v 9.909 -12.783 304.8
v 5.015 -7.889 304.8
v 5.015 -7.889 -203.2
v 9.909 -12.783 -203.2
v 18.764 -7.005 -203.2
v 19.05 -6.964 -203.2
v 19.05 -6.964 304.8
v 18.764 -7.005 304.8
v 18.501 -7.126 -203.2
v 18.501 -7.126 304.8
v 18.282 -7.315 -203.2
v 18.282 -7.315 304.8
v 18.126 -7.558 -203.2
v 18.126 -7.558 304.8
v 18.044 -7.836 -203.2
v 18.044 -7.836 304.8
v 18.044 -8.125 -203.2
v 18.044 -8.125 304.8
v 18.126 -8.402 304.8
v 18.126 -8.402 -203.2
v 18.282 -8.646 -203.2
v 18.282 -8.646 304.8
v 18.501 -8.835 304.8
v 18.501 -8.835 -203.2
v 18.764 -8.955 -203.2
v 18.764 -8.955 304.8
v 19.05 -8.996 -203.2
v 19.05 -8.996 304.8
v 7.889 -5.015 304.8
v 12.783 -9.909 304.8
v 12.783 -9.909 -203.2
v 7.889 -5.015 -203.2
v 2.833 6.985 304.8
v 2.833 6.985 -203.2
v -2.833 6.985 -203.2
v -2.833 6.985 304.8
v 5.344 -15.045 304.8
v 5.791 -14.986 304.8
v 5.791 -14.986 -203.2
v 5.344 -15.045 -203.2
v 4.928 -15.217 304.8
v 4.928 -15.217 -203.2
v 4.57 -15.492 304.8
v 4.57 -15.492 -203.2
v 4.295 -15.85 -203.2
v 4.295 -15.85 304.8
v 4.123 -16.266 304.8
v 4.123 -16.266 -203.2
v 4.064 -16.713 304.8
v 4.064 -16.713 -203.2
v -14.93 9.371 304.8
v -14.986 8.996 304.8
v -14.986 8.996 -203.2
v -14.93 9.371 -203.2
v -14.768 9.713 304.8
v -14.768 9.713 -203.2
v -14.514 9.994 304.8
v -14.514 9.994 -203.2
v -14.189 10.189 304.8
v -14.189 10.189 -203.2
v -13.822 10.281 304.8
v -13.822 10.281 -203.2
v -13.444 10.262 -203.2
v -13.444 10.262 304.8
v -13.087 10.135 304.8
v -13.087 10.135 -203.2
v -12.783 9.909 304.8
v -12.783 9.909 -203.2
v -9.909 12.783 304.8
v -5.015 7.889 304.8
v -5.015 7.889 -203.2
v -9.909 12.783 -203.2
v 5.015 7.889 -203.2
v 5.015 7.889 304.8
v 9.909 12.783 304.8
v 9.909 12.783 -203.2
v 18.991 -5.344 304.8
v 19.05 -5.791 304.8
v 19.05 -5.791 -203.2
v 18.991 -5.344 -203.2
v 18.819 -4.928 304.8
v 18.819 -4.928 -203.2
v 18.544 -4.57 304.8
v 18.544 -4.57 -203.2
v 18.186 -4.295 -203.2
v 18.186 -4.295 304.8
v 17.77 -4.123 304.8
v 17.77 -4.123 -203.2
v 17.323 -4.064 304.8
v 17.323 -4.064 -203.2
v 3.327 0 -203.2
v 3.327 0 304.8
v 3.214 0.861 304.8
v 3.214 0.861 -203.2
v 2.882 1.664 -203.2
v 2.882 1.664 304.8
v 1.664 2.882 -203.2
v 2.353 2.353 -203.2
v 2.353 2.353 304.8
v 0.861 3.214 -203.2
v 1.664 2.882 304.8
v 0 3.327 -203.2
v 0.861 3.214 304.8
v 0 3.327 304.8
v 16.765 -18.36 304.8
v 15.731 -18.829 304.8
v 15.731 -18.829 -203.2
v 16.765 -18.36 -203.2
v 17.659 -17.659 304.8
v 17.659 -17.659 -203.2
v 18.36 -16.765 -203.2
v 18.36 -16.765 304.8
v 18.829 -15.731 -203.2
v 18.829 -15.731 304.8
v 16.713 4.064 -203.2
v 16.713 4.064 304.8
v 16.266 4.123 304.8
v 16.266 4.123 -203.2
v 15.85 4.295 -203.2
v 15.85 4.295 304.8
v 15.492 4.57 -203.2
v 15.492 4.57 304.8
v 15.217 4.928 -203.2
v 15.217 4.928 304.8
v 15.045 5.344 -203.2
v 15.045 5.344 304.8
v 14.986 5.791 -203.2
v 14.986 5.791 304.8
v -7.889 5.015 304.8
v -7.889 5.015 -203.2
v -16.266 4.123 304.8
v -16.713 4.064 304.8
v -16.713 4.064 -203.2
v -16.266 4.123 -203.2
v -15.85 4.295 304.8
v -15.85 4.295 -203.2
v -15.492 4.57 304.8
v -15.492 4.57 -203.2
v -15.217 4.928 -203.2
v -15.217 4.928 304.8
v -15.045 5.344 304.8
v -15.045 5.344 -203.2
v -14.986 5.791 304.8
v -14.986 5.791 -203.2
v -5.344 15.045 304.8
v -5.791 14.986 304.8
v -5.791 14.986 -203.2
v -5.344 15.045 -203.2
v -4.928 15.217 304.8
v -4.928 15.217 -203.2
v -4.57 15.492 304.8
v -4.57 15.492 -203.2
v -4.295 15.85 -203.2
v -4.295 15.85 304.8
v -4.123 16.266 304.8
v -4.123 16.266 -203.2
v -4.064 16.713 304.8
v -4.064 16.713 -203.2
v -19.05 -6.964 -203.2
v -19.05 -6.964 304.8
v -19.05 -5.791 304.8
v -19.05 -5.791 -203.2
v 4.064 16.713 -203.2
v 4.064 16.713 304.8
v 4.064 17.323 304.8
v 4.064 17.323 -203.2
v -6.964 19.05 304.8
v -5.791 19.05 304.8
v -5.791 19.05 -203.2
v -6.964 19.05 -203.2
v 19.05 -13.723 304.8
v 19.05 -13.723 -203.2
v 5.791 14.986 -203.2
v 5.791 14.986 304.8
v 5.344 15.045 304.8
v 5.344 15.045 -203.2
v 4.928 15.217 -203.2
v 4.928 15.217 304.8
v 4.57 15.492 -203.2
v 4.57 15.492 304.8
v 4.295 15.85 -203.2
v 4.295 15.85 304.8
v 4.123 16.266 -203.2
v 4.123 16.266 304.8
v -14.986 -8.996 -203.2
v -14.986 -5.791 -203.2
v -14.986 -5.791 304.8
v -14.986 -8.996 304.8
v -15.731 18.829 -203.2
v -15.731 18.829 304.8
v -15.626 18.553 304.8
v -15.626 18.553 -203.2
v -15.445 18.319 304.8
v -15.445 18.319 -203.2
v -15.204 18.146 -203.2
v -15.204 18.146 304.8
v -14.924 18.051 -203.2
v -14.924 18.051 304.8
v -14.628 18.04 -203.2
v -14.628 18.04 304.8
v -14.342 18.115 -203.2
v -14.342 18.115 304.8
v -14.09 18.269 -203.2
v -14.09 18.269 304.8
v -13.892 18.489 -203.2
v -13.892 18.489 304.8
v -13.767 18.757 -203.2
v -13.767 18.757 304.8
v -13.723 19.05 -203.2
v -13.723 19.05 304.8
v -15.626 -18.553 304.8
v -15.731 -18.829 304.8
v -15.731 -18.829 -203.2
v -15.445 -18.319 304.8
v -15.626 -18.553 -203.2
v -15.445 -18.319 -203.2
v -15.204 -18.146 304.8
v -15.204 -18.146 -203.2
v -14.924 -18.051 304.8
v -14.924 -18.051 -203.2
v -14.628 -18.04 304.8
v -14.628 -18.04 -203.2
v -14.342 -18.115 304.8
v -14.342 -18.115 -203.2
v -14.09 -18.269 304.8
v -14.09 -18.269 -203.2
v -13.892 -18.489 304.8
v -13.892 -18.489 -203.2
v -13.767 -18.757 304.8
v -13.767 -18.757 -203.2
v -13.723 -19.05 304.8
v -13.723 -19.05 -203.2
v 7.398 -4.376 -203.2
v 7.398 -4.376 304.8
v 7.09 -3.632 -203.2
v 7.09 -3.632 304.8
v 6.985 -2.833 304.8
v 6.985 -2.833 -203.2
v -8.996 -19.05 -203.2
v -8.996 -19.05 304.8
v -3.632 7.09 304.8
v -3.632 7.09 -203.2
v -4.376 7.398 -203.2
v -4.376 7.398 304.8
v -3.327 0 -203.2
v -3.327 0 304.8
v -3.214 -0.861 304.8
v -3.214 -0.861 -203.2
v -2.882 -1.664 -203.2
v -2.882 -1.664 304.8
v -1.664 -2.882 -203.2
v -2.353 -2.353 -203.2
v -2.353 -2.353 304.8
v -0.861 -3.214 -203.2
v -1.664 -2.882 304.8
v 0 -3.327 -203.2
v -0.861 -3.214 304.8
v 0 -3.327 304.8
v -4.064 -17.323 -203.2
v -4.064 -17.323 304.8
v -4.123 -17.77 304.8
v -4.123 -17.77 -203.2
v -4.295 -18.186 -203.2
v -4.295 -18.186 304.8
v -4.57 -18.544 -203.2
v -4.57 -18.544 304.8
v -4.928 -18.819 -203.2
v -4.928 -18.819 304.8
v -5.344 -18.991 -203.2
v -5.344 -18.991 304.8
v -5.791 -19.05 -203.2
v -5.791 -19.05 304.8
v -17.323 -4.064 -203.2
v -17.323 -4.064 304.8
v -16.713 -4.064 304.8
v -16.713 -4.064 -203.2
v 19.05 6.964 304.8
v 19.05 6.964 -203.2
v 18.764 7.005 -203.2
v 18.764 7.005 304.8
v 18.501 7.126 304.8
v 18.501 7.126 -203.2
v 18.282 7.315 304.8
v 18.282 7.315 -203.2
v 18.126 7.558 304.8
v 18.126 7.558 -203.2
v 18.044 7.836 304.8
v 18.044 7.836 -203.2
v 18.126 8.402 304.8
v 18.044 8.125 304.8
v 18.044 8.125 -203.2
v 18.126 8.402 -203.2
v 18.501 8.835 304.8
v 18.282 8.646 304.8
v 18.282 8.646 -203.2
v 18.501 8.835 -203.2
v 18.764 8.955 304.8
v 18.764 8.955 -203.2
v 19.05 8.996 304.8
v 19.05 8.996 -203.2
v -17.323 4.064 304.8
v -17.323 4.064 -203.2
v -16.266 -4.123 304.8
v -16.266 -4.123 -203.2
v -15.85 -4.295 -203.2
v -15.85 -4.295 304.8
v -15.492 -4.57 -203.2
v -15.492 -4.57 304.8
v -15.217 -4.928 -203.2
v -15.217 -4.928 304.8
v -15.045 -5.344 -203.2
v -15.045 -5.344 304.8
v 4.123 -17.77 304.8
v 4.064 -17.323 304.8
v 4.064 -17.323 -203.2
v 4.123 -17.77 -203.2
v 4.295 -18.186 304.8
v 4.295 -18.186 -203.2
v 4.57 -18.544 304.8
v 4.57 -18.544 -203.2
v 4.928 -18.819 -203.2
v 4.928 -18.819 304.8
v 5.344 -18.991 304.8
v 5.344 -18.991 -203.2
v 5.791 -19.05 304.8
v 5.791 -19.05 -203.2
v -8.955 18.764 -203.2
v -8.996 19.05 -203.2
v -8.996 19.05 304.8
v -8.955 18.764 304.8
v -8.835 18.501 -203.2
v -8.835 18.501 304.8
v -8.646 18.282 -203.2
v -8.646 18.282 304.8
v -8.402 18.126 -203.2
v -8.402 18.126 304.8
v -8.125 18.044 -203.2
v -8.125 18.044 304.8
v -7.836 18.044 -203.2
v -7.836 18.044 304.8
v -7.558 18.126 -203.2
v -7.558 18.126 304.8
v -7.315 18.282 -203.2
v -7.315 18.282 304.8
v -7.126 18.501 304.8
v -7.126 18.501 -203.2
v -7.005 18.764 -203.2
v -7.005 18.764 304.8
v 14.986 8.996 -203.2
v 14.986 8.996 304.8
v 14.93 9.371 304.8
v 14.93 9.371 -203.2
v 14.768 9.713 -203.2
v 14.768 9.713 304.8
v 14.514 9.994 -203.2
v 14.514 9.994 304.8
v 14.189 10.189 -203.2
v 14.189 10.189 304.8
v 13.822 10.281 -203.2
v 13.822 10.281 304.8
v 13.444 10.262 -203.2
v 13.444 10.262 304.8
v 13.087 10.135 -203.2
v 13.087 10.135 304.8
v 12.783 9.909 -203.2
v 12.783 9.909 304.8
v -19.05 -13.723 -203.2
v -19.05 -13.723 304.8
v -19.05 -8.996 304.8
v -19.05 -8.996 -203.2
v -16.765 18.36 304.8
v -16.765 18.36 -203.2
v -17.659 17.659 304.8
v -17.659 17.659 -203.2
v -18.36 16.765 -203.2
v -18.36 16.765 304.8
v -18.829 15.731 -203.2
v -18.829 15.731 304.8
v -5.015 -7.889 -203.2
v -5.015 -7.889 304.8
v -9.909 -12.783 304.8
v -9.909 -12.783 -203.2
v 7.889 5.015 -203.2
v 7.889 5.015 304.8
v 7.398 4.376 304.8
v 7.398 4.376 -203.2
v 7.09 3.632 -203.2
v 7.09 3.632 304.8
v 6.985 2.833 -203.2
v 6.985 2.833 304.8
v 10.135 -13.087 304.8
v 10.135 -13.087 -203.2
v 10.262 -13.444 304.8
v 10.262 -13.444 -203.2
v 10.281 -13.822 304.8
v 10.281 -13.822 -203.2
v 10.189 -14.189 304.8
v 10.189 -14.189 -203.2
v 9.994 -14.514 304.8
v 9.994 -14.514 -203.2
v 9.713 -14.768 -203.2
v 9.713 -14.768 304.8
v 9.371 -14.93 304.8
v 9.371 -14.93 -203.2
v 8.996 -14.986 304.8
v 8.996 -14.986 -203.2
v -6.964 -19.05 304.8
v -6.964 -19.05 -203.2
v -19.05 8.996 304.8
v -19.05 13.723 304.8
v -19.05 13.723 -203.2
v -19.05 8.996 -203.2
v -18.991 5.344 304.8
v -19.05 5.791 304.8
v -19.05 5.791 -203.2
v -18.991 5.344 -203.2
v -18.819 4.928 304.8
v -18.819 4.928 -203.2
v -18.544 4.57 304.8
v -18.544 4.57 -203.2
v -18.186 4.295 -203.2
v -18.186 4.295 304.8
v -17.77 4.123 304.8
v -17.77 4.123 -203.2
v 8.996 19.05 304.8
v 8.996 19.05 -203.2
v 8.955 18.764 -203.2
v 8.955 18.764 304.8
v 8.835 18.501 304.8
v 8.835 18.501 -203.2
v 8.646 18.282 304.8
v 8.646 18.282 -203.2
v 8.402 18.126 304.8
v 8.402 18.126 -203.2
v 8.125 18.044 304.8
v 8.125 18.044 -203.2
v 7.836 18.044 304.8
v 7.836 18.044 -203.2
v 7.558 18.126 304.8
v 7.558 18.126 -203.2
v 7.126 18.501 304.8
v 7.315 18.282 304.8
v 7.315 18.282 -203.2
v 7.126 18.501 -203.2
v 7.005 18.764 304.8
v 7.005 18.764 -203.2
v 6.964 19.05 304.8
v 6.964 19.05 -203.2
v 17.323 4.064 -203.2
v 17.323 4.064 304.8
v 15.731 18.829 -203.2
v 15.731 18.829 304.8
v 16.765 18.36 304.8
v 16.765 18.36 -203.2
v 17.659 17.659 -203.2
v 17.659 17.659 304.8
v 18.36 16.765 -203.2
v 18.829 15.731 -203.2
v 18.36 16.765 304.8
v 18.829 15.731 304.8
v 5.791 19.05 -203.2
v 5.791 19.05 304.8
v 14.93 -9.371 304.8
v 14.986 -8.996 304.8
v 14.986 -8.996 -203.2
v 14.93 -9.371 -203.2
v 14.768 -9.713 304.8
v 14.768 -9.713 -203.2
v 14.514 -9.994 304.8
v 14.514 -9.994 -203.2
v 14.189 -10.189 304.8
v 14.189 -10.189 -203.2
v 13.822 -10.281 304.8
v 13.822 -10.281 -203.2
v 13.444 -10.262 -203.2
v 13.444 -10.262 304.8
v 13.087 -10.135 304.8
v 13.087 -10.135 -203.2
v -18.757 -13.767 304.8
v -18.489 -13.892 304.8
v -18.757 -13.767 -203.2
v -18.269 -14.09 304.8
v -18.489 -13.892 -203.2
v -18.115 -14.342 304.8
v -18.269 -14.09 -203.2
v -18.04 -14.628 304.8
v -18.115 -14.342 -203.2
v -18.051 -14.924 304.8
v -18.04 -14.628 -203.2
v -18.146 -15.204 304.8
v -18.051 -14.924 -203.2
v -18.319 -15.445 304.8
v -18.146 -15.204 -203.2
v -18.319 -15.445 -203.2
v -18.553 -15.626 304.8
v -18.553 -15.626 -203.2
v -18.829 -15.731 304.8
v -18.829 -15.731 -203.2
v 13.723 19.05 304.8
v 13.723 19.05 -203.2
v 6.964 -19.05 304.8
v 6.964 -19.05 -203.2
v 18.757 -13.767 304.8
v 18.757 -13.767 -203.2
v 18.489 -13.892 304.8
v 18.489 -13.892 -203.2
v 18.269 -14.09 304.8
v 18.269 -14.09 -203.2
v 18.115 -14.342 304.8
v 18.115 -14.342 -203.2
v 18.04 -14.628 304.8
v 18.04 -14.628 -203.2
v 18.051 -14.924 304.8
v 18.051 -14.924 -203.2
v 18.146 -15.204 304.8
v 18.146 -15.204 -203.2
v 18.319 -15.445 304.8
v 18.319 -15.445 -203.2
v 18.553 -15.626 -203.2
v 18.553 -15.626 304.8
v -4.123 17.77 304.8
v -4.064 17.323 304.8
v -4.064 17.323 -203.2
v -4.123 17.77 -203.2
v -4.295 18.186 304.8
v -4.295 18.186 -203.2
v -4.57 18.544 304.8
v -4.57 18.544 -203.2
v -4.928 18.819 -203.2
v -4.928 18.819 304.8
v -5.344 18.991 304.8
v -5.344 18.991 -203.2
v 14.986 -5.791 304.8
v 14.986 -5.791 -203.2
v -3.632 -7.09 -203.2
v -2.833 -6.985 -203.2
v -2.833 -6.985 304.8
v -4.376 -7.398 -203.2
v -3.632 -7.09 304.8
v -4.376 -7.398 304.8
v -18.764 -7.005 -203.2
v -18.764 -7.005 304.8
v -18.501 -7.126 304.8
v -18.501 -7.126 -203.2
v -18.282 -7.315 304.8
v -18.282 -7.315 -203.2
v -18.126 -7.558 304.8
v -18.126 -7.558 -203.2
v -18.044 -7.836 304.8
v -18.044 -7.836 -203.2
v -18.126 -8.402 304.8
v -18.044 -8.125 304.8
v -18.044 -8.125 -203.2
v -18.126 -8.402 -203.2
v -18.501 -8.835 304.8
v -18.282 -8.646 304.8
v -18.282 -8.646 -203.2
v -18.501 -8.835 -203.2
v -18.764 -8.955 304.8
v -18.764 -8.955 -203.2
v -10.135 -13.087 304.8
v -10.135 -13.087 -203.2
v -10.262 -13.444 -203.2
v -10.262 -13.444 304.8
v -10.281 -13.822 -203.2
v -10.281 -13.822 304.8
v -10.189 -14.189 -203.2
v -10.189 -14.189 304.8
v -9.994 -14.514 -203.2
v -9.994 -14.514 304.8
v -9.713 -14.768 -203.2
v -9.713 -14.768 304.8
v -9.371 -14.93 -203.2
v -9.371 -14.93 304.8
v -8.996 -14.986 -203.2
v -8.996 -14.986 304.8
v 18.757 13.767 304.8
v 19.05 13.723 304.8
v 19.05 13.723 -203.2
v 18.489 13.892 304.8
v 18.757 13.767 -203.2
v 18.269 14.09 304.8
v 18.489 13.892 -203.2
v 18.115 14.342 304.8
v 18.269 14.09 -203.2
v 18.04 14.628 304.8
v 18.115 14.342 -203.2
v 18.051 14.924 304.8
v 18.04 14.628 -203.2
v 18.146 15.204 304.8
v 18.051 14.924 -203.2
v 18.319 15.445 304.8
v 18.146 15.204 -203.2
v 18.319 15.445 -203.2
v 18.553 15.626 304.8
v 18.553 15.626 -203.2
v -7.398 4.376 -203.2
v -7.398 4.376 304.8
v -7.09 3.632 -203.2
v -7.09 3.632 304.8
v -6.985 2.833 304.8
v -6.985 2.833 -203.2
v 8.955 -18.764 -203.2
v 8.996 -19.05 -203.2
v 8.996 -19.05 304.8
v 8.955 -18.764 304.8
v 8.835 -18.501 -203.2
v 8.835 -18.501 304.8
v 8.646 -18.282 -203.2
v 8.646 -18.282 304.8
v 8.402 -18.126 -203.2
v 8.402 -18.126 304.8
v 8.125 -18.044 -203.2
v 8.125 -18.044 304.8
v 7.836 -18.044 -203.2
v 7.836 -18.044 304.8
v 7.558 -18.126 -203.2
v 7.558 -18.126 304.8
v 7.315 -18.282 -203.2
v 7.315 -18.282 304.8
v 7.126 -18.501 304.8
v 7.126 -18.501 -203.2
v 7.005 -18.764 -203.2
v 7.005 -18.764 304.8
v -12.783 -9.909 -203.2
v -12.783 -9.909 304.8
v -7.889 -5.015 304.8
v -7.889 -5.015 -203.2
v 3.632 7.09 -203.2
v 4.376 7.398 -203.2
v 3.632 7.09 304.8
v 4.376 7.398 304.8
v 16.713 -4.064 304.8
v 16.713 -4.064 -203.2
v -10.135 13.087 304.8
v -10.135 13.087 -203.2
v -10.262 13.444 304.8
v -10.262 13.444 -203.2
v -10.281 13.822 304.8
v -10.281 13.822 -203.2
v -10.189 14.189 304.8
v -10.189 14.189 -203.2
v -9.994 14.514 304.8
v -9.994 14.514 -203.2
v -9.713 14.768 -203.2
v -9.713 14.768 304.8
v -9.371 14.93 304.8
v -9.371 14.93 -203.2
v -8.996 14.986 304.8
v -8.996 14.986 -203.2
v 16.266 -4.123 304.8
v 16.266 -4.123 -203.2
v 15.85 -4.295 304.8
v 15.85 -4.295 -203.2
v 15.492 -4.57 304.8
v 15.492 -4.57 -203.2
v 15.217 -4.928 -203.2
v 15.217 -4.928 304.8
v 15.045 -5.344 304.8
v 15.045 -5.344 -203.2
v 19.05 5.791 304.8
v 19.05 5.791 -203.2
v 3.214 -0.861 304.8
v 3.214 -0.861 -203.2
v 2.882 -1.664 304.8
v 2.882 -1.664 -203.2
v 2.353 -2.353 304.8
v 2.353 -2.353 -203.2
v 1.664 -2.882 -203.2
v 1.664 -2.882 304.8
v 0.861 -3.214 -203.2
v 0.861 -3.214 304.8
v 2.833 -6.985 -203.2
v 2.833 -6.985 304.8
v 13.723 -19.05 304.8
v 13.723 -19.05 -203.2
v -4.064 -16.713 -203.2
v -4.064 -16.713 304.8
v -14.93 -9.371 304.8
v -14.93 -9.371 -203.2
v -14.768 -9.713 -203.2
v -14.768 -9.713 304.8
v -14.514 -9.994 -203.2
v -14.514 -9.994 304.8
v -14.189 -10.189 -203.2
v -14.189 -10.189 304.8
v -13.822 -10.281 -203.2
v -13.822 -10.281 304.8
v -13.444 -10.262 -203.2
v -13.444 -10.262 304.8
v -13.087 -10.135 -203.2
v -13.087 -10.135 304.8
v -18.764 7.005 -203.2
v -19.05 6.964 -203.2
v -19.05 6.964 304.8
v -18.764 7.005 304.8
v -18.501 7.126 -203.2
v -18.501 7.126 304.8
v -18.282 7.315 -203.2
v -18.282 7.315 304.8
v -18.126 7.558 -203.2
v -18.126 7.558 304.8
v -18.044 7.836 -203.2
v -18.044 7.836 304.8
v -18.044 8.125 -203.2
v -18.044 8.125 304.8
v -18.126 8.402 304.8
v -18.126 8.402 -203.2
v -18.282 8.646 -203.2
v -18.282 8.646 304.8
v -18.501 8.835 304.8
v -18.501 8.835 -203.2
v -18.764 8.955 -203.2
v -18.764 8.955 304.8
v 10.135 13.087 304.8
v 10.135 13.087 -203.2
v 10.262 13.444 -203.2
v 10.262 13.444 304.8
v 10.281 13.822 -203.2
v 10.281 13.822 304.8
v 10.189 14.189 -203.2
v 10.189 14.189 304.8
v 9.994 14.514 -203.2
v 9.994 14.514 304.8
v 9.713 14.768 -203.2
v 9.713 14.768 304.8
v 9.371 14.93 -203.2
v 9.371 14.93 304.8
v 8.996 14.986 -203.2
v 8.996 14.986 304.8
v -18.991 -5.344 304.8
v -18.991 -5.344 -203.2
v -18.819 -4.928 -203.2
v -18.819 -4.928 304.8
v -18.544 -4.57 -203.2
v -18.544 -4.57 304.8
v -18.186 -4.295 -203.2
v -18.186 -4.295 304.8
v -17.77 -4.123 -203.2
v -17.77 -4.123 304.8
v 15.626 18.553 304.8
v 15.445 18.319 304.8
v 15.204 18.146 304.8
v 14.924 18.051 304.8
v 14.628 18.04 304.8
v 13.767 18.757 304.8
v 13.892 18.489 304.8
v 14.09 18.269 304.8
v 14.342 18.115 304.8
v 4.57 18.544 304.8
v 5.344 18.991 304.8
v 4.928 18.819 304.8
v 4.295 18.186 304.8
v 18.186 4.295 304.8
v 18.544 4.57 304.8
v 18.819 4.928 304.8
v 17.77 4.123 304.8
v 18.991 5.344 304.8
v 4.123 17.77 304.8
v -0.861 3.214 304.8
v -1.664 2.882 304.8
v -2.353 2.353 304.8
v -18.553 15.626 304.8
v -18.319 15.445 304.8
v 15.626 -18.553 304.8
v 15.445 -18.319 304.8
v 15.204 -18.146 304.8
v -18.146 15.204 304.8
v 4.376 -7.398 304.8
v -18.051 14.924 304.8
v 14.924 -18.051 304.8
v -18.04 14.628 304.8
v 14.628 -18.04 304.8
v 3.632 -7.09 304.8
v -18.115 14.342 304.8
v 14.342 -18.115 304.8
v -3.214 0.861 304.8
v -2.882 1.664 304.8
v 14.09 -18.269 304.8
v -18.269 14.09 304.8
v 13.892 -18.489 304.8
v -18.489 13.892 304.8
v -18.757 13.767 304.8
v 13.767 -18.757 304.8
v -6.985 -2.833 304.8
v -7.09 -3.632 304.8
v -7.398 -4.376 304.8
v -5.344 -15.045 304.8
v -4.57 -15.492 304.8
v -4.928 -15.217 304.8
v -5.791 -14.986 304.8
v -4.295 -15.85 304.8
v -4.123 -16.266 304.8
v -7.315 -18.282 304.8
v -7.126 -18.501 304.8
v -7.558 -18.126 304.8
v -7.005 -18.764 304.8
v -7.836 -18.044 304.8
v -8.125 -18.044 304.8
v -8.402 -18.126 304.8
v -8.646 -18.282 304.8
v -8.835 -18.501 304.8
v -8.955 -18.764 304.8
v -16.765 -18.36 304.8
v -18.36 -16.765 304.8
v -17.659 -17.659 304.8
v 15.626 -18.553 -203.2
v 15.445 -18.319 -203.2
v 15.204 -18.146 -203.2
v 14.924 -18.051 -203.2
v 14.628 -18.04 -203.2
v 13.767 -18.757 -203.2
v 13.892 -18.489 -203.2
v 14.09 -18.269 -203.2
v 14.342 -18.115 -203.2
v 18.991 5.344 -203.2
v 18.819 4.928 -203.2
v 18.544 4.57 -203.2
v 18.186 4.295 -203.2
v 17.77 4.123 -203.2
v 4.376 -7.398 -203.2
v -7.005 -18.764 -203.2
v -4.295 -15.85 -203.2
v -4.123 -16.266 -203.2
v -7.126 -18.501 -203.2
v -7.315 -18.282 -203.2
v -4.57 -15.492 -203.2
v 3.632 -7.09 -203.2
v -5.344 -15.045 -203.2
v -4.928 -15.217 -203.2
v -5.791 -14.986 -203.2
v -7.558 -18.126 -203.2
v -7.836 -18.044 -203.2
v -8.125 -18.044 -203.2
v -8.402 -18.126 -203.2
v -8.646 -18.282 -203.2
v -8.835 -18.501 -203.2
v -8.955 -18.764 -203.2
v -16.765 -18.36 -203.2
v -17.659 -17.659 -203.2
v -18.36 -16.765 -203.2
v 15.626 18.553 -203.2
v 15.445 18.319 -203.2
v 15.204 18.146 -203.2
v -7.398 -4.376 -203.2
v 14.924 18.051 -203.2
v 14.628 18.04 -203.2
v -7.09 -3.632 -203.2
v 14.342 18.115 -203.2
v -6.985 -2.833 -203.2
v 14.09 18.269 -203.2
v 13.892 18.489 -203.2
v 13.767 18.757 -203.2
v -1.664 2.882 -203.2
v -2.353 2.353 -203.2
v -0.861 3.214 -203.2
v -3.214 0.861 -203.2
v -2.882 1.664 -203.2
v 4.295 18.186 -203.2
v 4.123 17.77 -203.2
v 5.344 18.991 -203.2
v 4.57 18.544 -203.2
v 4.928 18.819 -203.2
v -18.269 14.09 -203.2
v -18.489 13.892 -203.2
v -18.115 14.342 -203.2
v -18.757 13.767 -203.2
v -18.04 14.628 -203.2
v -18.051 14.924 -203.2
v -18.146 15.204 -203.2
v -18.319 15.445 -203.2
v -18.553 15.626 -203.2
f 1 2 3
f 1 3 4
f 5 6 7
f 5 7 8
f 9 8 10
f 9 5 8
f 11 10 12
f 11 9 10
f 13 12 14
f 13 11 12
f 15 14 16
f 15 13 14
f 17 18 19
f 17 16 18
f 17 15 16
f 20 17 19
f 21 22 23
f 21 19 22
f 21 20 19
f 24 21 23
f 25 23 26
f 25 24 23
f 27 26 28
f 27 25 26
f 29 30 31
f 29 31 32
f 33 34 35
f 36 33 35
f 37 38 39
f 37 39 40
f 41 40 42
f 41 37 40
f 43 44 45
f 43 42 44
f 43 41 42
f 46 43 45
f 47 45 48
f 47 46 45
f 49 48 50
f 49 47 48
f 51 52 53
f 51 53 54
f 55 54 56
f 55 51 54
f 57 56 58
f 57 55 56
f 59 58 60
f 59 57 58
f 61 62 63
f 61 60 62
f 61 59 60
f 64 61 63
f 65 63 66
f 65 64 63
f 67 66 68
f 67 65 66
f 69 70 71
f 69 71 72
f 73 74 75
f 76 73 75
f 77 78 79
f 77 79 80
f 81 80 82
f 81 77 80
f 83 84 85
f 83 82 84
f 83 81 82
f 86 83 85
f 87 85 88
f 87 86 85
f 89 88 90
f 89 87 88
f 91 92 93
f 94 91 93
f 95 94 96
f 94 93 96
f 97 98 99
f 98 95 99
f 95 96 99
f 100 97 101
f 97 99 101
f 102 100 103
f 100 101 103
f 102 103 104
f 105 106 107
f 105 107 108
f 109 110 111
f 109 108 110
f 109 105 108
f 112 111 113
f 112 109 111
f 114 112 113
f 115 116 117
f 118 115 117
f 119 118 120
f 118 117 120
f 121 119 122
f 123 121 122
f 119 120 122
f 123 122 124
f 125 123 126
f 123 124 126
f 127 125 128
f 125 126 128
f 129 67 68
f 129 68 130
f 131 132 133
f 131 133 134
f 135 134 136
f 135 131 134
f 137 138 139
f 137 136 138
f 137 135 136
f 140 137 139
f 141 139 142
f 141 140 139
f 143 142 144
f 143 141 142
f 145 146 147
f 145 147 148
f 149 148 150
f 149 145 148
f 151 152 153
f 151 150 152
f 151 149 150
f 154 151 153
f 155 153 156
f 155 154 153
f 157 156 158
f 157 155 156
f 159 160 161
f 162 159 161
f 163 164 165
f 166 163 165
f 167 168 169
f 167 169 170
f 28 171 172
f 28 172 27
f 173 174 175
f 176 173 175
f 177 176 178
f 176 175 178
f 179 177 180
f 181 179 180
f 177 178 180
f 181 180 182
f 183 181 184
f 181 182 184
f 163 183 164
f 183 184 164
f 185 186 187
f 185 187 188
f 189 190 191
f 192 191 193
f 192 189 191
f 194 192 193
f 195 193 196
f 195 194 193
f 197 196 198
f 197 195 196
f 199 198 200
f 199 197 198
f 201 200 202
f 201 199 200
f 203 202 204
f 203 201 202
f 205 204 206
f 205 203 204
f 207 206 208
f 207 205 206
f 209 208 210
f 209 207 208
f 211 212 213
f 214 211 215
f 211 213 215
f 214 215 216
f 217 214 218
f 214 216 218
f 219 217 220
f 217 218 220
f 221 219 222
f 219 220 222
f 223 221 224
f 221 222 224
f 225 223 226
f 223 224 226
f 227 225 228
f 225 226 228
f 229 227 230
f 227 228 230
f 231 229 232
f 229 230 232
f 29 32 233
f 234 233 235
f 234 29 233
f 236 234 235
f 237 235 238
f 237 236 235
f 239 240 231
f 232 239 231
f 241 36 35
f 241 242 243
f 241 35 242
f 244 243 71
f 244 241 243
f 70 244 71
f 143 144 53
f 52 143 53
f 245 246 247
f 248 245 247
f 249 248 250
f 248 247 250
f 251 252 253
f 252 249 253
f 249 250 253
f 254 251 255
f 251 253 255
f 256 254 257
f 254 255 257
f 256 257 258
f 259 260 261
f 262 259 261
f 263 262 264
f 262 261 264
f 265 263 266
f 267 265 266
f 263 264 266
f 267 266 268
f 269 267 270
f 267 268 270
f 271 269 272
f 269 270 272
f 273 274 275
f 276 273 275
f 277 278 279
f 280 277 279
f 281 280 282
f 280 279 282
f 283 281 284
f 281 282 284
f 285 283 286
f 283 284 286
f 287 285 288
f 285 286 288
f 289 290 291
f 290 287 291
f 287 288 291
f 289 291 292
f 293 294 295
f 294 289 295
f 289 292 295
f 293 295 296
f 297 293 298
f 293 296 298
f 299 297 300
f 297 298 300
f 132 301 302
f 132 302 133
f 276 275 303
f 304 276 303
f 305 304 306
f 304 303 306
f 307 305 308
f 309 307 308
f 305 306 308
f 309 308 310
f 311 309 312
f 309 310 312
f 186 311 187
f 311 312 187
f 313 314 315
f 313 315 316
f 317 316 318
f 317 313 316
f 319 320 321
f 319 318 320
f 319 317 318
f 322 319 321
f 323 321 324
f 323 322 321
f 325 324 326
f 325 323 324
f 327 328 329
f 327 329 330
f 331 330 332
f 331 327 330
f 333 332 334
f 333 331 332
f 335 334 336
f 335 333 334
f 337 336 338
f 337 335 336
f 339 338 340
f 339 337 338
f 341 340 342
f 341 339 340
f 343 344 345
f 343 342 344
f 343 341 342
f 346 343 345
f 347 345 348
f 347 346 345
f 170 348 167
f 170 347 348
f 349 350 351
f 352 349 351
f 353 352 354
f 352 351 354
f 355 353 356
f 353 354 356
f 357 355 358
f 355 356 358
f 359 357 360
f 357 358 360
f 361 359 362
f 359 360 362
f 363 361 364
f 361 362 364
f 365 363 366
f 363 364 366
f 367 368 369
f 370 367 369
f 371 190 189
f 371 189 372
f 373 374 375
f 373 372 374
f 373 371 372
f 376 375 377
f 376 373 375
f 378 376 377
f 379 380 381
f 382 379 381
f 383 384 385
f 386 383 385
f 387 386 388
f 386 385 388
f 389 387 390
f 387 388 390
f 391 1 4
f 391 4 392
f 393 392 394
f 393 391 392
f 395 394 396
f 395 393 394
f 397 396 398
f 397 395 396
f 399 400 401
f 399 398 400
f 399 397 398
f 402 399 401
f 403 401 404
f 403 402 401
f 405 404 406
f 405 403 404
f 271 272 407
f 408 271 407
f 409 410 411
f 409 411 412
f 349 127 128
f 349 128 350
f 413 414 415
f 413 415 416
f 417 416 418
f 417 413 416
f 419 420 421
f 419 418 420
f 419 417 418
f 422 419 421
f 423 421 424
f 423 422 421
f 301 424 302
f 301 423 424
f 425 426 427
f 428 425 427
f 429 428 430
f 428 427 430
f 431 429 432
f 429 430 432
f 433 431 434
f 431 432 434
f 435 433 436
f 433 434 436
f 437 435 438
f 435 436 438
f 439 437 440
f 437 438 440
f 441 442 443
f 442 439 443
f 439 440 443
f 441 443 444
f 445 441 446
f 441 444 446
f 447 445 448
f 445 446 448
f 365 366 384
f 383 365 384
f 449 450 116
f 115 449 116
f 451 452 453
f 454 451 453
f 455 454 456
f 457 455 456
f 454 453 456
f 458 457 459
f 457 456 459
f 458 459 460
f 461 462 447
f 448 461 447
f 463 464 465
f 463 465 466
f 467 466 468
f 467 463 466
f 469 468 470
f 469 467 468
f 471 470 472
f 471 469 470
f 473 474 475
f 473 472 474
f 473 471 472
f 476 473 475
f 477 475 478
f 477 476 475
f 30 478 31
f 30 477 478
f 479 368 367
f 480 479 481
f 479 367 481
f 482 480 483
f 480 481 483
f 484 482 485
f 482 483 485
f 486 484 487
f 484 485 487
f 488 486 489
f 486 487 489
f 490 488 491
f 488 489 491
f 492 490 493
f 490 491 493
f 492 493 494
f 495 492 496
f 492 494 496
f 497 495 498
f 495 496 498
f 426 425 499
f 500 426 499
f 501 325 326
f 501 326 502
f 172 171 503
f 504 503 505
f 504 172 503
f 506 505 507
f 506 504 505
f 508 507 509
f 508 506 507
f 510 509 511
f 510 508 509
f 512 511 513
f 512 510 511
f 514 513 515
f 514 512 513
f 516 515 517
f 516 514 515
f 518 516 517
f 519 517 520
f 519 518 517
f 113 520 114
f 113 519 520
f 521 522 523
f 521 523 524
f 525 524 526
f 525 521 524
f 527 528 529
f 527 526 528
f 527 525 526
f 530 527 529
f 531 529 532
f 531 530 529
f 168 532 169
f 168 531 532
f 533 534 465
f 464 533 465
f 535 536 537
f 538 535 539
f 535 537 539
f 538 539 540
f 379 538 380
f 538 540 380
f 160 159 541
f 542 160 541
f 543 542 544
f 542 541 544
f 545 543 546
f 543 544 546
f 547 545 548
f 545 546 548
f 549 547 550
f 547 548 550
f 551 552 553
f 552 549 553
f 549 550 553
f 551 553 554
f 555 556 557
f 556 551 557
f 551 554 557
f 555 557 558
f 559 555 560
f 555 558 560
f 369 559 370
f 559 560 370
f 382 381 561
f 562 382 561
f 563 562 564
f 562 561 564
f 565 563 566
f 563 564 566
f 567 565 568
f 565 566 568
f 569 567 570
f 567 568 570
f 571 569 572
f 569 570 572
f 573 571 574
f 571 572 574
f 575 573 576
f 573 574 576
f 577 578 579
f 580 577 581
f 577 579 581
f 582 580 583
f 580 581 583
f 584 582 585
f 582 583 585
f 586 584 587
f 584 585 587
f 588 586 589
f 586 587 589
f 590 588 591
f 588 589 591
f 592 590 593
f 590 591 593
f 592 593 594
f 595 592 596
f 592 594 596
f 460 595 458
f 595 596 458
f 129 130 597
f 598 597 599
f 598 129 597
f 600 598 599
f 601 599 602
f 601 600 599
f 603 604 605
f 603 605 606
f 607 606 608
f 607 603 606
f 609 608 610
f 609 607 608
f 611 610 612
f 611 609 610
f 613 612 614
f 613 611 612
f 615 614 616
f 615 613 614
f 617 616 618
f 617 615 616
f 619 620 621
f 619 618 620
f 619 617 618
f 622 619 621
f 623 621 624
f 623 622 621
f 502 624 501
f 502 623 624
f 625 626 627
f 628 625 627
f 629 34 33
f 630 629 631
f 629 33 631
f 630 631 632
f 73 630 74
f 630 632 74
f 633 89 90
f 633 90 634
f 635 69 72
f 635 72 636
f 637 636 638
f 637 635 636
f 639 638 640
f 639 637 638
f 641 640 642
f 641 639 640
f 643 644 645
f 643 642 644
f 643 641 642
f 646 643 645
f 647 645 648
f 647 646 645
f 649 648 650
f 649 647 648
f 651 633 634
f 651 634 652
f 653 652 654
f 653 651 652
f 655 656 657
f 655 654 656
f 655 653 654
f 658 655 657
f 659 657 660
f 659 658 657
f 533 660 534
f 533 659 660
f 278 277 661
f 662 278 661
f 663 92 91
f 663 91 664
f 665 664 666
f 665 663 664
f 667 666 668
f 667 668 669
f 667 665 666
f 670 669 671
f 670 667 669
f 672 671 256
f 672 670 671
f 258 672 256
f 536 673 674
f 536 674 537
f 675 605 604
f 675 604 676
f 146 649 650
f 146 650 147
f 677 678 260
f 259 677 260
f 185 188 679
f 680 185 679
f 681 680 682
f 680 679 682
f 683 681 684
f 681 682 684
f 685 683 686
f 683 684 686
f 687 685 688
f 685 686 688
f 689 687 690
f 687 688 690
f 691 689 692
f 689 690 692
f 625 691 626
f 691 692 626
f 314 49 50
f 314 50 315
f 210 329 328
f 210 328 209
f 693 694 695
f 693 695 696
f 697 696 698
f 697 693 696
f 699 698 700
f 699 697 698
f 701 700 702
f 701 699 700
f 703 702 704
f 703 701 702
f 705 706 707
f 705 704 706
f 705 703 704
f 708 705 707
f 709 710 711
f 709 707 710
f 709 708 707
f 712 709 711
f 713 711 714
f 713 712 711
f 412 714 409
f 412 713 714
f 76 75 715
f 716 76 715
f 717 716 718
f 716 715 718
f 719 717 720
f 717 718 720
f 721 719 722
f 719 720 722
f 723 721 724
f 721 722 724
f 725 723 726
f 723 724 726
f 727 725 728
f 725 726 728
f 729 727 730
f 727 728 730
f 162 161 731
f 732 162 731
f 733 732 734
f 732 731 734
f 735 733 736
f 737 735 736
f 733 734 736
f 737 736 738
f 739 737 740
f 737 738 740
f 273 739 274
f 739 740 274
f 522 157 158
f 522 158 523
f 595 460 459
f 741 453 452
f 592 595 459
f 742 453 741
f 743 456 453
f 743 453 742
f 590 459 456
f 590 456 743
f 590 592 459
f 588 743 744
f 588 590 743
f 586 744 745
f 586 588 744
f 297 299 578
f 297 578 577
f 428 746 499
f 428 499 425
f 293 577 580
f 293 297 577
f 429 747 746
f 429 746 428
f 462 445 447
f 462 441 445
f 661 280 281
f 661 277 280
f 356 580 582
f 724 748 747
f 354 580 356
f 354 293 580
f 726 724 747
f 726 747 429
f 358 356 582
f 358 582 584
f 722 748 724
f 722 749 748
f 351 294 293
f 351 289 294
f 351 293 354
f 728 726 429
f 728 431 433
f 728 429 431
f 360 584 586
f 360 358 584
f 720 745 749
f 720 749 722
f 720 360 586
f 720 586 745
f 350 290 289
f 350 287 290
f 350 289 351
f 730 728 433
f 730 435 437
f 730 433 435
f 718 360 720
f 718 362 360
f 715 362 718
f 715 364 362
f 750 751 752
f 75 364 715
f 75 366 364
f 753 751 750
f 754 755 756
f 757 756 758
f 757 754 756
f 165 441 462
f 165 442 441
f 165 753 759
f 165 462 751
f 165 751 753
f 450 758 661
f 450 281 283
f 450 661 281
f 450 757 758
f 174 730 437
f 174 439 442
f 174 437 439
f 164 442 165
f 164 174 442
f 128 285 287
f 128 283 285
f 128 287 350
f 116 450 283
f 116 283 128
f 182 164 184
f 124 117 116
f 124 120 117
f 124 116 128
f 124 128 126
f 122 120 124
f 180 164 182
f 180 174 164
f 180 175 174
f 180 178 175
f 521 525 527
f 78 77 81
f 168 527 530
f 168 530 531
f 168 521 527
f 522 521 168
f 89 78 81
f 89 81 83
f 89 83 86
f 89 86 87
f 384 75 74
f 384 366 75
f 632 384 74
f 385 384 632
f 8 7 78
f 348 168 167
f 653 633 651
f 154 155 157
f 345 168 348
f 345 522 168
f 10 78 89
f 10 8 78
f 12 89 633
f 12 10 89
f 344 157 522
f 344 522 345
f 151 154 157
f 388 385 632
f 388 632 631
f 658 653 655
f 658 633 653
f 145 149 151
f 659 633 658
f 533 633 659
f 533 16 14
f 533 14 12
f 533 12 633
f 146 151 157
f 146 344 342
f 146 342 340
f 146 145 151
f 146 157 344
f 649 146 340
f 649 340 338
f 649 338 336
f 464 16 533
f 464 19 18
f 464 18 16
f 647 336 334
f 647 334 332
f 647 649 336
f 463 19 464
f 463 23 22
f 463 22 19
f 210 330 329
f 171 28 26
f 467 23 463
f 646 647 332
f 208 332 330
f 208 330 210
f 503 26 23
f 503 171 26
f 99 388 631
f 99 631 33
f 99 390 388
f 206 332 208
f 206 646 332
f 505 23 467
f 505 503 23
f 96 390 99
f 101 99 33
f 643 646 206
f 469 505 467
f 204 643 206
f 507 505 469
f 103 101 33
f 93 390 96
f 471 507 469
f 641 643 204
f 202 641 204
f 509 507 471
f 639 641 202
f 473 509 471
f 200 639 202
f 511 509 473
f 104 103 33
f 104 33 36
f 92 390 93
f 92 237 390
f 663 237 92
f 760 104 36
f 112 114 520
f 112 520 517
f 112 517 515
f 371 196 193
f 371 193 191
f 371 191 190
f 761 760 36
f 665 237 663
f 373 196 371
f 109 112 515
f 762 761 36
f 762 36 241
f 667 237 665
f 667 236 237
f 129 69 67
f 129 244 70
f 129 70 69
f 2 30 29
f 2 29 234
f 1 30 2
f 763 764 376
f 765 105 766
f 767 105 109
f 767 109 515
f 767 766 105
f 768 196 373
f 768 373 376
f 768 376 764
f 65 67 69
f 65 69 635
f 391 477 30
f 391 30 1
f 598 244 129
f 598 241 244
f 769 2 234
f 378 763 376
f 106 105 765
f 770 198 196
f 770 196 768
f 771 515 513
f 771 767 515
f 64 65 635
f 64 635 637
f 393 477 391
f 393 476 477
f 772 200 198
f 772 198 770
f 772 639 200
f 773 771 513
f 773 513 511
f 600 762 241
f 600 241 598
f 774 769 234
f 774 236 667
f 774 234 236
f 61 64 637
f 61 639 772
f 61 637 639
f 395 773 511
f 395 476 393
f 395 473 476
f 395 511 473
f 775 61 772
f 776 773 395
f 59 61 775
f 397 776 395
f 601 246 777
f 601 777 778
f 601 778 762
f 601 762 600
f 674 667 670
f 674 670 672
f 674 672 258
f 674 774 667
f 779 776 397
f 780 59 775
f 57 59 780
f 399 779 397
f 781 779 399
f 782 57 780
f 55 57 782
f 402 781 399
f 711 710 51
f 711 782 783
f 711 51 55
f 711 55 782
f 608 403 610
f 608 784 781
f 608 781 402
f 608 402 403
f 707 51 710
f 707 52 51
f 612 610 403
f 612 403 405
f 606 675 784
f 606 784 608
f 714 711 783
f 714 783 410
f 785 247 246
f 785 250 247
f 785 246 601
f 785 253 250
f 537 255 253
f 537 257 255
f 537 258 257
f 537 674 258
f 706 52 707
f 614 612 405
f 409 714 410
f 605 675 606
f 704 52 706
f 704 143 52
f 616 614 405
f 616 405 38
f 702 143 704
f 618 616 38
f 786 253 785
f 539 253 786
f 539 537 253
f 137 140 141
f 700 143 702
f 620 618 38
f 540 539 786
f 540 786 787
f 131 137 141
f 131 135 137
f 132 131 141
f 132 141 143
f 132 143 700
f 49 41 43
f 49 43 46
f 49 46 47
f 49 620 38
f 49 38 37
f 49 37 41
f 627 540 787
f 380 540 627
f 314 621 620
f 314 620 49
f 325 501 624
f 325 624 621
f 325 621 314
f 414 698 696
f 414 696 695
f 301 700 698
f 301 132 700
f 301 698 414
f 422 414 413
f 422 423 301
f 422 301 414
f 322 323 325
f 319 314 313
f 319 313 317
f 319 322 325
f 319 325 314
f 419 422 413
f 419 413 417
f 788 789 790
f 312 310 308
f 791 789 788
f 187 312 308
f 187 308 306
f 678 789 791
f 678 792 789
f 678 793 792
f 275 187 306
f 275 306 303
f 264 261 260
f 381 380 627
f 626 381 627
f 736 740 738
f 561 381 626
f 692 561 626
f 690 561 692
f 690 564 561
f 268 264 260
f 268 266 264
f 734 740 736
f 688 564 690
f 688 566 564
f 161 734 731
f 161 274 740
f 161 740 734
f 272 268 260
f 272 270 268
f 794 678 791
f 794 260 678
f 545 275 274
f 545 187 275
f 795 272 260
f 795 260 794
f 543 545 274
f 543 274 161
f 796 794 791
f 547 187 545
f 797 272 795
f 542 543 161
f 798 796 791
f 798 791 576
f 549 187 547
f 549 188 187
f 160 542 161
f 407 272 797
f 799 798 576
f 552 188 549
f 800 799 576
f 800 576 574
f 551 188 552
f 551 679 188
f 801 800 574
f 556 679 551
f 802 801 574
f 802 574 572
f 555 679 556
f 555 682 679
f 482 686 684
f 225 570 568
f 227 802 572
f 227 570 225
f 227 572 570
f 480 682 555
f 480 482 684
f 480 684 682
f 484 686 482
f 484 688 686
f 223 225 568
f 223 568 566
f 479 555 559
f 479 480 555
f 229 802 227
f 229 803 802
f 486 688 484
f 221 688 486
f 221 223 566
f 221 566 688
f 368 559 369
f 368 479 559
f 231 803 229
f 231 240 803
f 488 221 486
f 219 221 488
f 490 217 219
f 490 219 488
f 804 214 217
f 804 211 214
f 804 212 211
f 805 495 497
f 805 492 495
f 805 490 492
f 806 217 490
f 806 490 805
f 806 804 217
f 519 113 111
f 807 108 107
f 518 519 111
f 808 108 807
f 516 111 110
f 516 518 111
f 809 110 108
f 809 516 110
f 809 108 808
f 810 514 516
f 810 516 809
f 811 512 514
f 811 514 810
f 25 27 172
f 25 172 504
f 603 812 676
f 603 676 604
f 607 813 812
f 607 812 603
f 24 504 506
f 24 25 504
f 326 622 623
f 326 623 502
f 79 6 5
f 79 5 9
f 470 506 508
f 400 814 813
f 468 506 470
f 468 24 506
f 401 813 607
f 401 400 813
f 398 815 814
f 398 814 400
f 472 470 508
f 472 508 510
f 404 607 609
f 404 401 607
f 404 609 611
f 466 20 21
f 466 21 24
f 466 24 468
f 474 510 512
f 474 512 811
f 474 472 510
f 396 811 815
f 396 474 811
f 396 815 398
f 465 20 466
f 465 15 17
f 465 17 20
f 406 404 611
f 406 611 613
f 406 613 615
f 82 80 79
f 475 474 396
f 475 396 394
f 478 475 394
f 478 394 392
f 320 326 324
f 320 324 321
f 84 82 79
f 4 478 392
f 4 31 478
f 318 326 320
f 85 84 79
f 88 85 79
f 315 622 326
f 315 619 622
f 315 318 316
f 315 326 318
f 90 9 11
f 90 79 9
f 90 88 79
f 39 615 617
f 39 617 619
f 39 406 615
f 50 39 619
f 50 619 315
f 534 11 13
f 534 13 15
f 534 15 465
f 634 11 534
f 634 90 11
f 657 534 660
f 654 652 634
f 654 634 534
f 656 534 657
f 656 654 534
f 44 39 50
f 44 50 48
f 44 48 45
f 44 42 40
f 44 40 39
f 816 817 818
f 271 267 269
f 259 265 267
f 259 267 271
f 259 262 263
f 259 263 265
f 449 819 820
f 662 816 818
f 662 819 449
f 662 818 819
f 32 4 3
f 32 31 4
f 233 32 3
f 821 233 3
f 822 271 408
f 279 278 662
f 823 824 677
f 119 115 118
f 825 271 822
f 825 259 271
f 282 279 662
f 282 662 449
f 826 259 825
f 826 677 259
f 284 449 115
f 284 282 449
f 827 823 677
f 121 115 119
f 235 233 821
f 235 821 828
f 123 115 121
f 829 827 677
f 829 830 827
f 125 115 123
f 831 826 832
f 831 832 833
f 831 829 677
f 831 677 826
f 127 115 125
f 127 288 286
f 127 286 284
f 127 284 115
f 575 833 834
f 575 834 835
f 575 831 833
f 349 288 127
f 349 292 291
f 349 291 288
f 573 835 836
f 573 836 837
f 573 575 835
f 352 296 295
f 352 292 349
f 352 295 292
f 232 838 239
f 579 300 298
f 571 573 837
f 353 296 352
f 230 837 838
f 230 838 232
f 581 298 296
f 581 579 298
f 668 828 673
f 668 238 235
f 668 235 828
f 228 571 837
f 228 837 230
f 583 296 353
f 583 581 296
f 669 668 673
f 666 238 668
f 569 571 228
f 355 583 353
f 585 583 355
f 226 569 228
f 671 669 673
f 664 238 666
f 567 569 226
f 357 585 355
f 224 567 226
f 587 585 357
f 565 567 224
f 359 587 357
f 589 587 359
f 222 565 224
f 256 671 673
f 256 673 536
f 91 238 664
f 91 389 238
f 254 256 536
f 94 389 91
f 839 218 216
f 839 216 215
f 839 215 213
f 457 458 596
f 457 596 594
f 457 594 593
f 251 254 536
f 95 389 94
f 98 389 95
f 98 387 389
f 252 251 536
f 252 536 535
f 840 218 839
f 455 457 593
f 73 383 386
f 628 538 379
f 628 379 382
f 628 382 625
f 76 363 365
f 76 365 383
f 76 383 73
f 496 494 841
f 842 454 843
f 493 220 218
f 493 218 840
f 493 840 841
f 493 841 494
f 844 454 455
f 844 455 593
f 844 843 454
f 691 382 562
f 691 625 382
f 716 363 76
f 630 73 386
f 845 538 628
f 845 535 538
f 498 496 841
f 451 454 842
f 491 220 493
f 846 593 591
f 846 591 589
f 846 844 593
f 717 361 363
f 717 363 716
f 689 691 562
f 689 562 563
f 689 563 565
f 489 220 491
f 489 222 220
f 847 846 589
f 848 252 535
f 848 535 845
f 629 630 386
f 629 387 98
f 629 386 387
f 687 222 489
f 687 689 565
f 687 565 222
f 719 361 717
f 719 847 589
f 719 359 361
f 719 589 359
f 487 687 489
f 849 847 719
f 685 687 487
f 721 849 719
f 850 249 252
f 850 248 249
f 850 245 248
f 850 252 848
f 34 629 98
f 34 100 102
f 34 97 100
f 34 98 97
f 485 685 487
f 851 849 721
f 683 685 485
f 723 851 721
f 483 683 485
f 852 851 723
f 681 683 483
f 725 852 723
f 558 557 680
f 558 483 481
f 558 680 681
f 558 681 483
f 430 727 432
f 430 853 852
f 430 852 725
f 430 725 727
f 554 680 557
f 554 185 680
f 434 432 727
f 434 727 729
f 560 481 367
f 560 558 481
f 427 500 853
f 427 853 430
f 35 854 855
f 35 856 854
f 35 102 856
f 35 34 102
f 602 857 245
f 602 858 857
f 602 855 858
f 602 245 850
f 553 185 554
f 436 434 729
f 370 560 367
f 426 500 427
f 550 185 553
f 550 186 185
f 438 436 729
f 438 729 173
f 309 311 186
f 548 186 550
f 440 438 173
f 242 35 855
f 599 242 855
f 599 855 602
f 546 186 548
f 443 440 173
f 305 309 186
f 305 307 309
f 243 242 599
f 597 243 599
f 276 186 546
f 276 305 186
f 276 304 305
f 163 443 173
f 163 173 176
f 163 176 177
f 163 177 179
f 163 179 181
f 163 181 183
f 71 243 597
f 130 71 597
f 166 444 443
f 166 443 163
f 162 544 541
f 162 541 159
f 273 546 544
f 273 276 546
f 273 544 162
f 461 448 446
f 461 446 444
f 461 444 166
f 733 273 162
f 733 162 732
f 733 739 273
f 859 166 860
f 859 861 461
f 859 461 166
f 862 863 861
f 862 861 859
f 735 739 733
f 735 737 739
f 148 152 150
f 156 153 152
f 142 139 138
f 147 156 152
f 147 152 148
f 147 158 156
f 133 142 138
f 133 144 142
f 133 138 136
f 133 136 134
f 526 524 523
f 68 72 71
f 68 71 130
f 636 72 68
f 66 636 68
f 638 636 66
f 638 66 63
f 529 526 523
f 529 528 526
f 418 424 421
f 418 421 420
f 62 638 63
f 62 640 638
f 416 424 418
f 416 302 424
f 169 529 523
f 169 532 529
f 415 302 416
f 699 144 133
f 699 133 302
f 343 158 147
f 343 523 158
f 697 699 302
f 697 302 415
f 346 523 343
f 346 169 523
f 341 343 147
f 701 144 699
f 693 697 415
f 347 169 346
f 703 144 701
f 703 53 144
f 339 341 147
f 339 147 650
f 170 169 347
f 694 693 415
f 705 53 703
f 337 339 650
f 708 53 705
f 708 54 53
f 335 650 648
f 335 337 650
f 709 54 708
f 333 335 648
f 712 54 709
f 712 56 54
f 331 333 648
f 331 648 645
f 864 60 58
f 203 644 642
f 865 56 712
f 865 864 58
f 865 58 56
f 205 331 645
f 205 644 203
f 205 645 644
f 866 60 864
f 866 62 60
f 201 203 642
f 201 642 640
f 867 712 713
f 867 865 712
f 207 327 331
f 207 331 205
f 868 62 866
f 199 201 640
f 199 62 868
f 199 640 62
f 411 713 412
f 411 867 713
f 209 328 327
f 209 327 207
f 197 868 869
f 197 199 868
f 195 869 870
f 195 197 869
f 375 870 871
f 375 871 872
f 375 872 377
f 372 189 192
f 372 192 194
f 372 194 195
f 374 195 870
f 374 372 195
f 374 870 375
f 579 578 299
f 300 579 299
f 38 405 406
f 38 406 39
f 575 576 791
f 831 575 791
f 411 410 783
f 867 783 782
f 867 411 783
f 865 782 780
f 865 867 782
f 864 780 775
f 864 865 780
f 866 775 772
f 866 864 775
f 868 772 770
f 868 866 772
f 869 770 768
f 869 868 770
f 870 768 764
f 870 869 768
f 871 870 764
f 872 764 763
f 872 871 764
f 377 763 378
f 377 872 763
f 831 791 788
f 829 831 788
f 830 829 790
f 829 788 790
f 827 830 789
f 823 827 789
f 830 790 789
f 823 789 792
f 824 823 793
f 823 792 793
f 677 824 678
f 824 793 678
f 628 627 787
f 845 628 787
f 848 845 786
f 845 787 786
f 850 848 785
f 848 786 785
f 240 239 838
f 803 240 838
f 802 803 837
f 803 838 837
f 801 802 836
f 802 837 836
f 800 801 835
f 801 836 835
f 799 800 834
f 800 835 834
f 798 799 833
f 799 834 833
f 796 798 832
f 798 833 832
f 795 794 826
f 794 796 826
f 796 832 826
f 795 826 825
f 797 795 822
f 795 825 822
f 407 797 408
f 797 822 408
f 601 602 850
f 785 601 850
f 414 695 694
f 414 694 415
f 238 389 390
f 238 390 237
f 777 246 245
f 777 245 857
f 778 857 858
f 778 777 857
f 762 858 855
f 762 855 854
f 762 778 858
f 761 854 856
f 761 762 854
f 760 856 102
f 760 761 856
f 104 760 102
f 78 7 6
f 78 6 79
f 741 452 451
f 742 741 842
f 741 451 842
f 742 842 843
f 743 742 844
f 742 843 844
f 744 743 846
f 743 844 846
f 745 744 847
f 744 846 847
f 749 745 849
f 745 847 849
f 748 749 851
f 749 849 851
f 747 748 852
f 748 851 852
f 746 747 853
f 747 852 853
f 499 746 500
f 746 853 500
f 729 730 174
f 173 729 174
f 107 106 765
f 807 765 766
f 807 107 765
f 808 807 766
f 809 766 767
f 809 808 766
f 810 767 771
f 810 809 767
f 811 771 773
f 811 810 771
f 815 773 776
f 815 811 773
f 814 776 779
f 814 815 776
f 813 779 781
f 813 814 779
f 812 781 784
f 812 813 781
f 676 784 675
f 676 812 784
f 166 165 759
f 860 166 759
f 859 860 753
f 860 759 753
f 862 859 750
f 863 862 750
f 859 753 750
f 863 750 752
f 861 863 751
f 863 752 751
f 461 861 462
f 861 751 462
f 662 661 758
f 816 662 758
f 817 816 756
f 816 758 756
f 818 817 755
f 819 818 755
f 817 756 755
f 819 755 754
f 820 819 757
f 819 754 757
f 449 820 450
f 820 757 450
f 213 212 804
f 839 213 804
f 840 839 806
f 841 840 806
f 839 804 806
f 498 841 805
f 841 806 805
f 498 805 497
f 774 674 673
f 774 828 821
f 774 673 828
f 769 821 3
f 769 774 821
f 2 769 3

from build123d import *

# Parameters (mm, degrees)
BOSS_EXTRUDE1_DEPTH     = 304.8
CUT_EXTRUDE1_DEPTH      = 306.9883086
CUT_EXTRUDE1_DEPTH_BACK = 306.9883086
SKETCH5_R               = 1.016
CUT_EXTRUDE2_START      = -101.6
SKETCH6_R               = 3.3274
CUT_EXTRUDE2_DEPTH      = 101.6


with BuildPart() as part:
    # Sketch4 → Boss-Extrude1 (new, symmetric)
    with BuildSketch(Plane.XY):
        with BuildLine():
            Line((5.7912, -19.05), (14.3002, -19.05))
            ThreePointArc((14.3002, -19.05), (17.658815789, -17.658815789), (19.05, -14.3002))
            Line((19.05, -14.3002), (19.05, -5.7912))
            ThreePointArc((19.05, -5.7912), (18.544114832, -4.569885168), (17.3228, -4.064))
            Line((17.3228, -4.064), (16.7132, -4.064))
            ThreePointArc((16.7132, -4.064), (15.491885168, -4.569885168), (14.986, -5.7912))
            Line((14.986, -5.7912), (14.986, -8.996305235))
            ThreePointArc((14.986, -8.996305235), (14.189232738, -10.188751711), (12.782646215, -9.908964256))
            Line((12.782646215, -9.908964256), (7.888897763, -5.015215804))
            ThreePointArc((7.888897763, -5.015215804), (7.219915375, -4.014012907), (6.985, -2.833013566))
            Line((6.985, -2.833013566), (6.985, 0))
            Line((6.985, 0), (3.3274, 0))
            ThreePointArc((3.3274, 0), (2.352827104, -2.352827104), (0, -3.3274))
            Line((0, -3.3274), (0, -6.985))
            Line((0, -6.985), (2.833013566, -6.985))
            ThreePointArc((2.833013566, -6.985), (4.014012907, -7.219915375), (5.015215804, -7.888897763))
            Line((5.015215804, -7.888897763), (9.908964256, -12.782646215))
            ThreePointArc((9.908964256, -12.782646215), (10.188751711, -14.189232738), (8.996305235, -14.986))
            Line((8.996305235, -14.986), (5.7912, -14.986))
            ThreePointArc((5.7912, -14.986), (4.569885168, -15.491885168), (4.064, -16.7132))
            Line((4.064, -16.7132), (4.064, -17.3228))
            ThreePointArc((4.064, -17.3228), (4.569885168, -18.544114832), (5.7912, -19.05))
        make_face()
    extrude(amount=BOSS_EXTRUDE1_DEPTH, both=True)

    # Sketch5 → Cut-Extrude1 (cut, two sides: drawn at the far end of the back side and taken through both)
    with BuildSketch(Plane.XY.offset(-CUT_EXTRUDE1_DEPTH_BACK)):
        with Locations((14.739477062, -19.05)):
            Circle(SKETCH5_R)
        with Locations((7.980305235, -19.05)):
            Circle(SKETCH5_R)
        with Locations((19.05, -14.739477062)):
            Circle(SKETCH5_R)
        with Locations((19.05, -7.980305235)):
            Circle(SKETCH5_R)
    extrude(amount=CUT_EXTRUDE1_DEPTH + CUT_EXTRUDE1_DEPTH_BACK, mode=Mode.SUBTRACT)

    # Mirror1: part across plane


with BuildPart() as part_1:
    add(part.part)
    add(part.part.mirror(Plane(origin=(0, 0, 0), x_dir=(0, 0, 1), z_dir=(1, 0, 0))))

    # Mirror2: part across plane


with BuildPart() as part_2:
    add(part_1.part)
    add(part_1.part.mirror(Plane.ZX))

    # Sketch6 → Cut-Extrude2 (cut)
    with BuildSketch(Plane(origin=(0, 0, -304.8), x_dir=(-1, 0, 0), z_dir=(0, 0, -1)).offset(CUT_EXTRUDE2_START)):
        with BuildLine():
            Line((-19.05, -5.7912), (-19.05, -6.964305235))
            ThreePointArc((-19.05, -6.964305235), (-18.034, -7.980305235), (-19.05, -8.996305235))
            Line((-19.05, -8.996305235), (-19.05, -13.723477062))
            ThreePointArc((-19.05, -13.723477062), (-18.040083046, -14.628464695), (-18.829304583, -15.73121772))
            ThreePointArc((-18.829304583, -15.73121772), (-17.658815789, -17.658815789), (-15.73121772, -18.829304583))
            ThreePointArc((-15.73121772, -18.829304583), (-14.628464695, -18.040083046), (-13.723477062, -19.05))
            Line((-13.723477062, -19.05), (-8.996305235, -19.05))
            ThreePointArc((-8.996305235, -19.05), (-7.980305235, -18.034), (-6.964305235, -19.05))
            Line((-6.964305235, -19.05), (-5.7912, -19.05))
            ThreePointArc((-5.7912, -19.05), (-4.569885168, -18.544114832), (-4.064, -17.3228))
            Line((-4.064, -17.3228), (-4.064, -16.7132))
            ThreePointArc((-4.064, -16.7132), (-4.569885168, -15.491885168), (-5.7912, -14.986))
            Line((-5.7912, -14.986), (-8.996305235, -14.986))
            ThreePointArc((-8.996305235, -14.986), (-10.188751711, -14.189232738), (-9.908964256, -12.782646215))
            Line((-9.908964256, -12.782646215), (-5.015215804, -7.888897763))
            ThreePointArc((-5.015215804, -7.888897763), (-4.014012907, -7.219915375), (-2.833013566, -6.985))
            Line((-2.833013566, -6.985), (2.833013566, -6.985))
            ThreePointArc((2.833013566, -6.985), (4.014012907, -7.219915375), (5.015215804, -7.888897763))
            Line((5.015215804, -7.888897763), (9.908964256, -12.782646215))
            ThreePointArc((9.908964256, -12.782646215), (10.188751711, -14.189232738), (8.996305235, -14.986))
            Line((8.996305235, -14.986), (5.7912, -14.986))
            ThreePointArc((5.7912, -14.986), (4.569885168, -15.491885168), (4.064, -16.7132))
            Line((4.064, -16.7132), (4.064, -17.3228))
            ThreePointArc((4.064, -17.3228), (4.569885168, -18.544114832), (5.7912, -19.05))
            Line((5.7912, -19.05), (6.964305235, -19.05))
            ThreePointArc((6.964305235, -19.05), (7.980305235, -18.034), (8.996305235, -19.05))
            Line((8.996305235, -19.05), (13.723477062, -19.05))
            ThreePointArc((13.723477062, -19.05), (14.628464695, -18.040083046), (15.73121772, -18.829304583))
            ThreePointArc((15.73121772, -18.829304583), (17.658815789, -17.658815789), (18.829304583, -15.73121772))
            ThreePointArc((18.829304583, -15.73121772), (18.040083046, -14.628464695), (19.05, -13.723477062))
            Line((19.05, -13.723477062), (19.05, -8.996305235))
            ThreePointArc((19.05, -8.996305235), (18.034, -7.980305235), (19.05, -6.964305235))
            Line((19.05, -6.964305235), (19.05, -5.7912))
            ThreePointArc((19.05, -5.7912), (18.544114832, -4.569885168), (17.3228, -4.064))
            Line((17.3228, -4.064), (16.7132, -4.064))
            ThreePointArc((16.7132, -4.064), (15.491885168, -4.569885168), (14.986, -5.7912))
            Line((14.986, -5.7912), (14.986, -8.996305235))
            ThreePointArc((14.986, -8.996305235), (14.189232738, -10.188751711), (12.782646215, -9.908964256))
            Line((12.782646215, -9.908964256), (7.888897763, -5.015215804))
            ThreePointArc((7.888897763, -5.015215804), (7.219915375, -4.014012907), (6.985, -2.833013566))
            Line((6.985, -2.833013566), (6.985, 2.833013566))
            ThreePointArc((6.985, 2.833013566), (7.219915375, 4.014012907), (7.888897763, 5.015215804))
            Line((7.888897763, 5.015215804), (12.782646215, 9.908964256))
            ThreePointArc((12.782646215, 9.908964256), (14.189232738, 10.188751711), (14.986, 8.996305235))
            Line((14.986, 8.996305235), (14.986, 5.7912))
            ThreePointArc((14.986, 5.7912), (15.491885168, 4.569885168), (16.7132, 4.064))
            Line((16.7132, 4.064), (17.3228, 4.064))
            ThreePointArc((17.3228, 4.064), (18.544114832, 4.569885168), (19.05, 5.7912))
            Line((19.05, 5.7912), (19.05, 6.964305235))
            ThreePointArc((19.05, 6.964305235), (18.034, 7.980305235), (19.05, 8.996305235))
            Line((19.05, 8.996305235), (19.05, 13.723477062))
            ThreePointArc((19.05, 13.723477062), (18.040083046, 14.628464695), (18.829304583, 15.73121772))
            ThreePointArc((18.829304583, 15.73121772), (17.658815789, 17.658815789), (15.73121772, 18.829304583))
            ThreePointArc((15.73121772, 18.829304583), (14.628464695, 18.040083046), (13.723477062, 19.05))
            Line((13.723477062, 19.05), (8.996305235, 19.05))
            ThreePointArc((8.996305235, 19.05), (7.980305235, 18.034), (6.964305235, 19.05))
            Line((6.964305235, 19.05), (5.7912, 19.05))
            ThreePointArc((5.7912, 19.05), (4.569885168, 18.544114832), (4.064, 17.3228))
            Line((4.064, 17.3228), (4.064, 16.7132))
            ThreePointArc((4.064, 16.7132), (4.569885168, 15.491885168), (5.7912, 14.986))
            Line((5.7912, 14.986), (8.996305235, 14.986))
            ThreePointArc((8.996305235, 14.986), (10.188751711, 14.189232738), (9.908964256, 12.782646215))
            Line((9.908964256, 12.782646215), (5.015215804, 7.888897763))
            ThreePointArc((5.015215804, 7.888897763), (4.014012907, 7.219915375), (2.833013566, 6.985))
            Line((2.833013566, 6.985), (-2.833013566, 6.985))
            ThreePointArc((-2.833013566, 6.985), (-4.014012907, 7.219915375), (-5.015215804, 7.888897763))
            Line((-5.015215804, 7.888897763), (-9.908964256, 12.782646215))
            ThreePointArc((-9.908964256, 12.782646215), (-10.188751711, 14.189232738), (-8.996305235, 14.986))
            Line((-8.996305235, 14.986), (-5.7912, 14.986))
            ThreePointArc((-5.7912, 14.986), (-4.569885168, 15.491885168), (-4.064, 16.7132))
            Line((-4.064, 16.7132), (-4.064, 17.3228))
            ThreePointArc((-4.064, 17.3228), (-4.569885168, 18.544114832), (-5.7912, 19.05))
            Line((-5.7912, 19.05), (-6.964305235, 19.05))
            ThreePointArc((-6.964305235, 19.05), (-7.980305235, 18.034), (-8.996305235, 19.05))
            Line((-8.996305235, 19.05), (-13.723477062, 19.05))
            ThreePointArc((-13.723477062, 19.05), (-14.628464695, 18.040083046), (-15.73121772, 18.829304583))
            ThreePointArc((-15.73121772, 18.829304583), (-17.658815789, 17.658815789), (-18.829304583, 15.73121772))
            ThreePointArc((-18.829304583, 15.73121772), (-18.040083046, 14.628464695), (-19.05, 13.723477062))
            Line((-19.05, 13.723477062), (-19.05, 8.996305235))
            ThreePointArc((-19.05, 8.996305235), (-18.034, 7.980305235), (-19.05, 6.964305235))
            Line((-19.05, 6.964305235), (-19.05, 5.7912))
            ThreePointArc((-19.05, 5.7912), (-18.544114832, 4.569885168), (-17.3228, 4.064))
            Line((-17.3228, 4.064), (-16.7132, 4.064))
            ThreePointArc((-16.7132, 4.064), (-15.491885168, 4.569885168), (-14.986, 5.7912))
            Line((-14.986, 5.7912), (-14.986, 8.996305235))
            ThreePointArc((-14.986, 8.996305235), (-14.189232738, 10.188751711), (-12.782646215, 9.908964256))
            Line((-12.782646215, 9.908964256), (-7.888897763, 5.015215804))
            ThreePointArc((-7.888897763, 5.015215804), (-7.219915375, 4.014012907), (-6.985, 2.833013566))
            Line((-6.985, 2.833013566), (-6.985, -2.833013566))
            ThreePointArc((-6.985, -2.833013566), (-7.219915375, -4.014012907), (-7.888897763, -5.015215804))
            Line((-7.888897763, -5.015215804), (-12.782646215, -9.908964256))
            ThreePointArc((-12.782646215, -9.908964256), (-14.189232738, -10.188751711), (-14.986, -8.996305235))
            Line((-14.986, -8.996305235), (-14.986, -5.7912))
            ThreePointArc((-14.986, -5.7912), (-15.491885168, -4.569885168), (-16.7132, -4.064))
            Line((-16.7132, -4.064), (-17.3228, -4.064))
            ThreePointArc((-17.3228, -4.064), (-18.544114832, -4.569885168), (-19.05, -5.7912))
        make_face()
        Circle(SKETCH6_R, mode=Mode.SUBTRACT)
    extrude(amount=CUT_EXTRUDE2_DEPTH, mode=Mode.SUBTRACT)


solid = part_2.part
